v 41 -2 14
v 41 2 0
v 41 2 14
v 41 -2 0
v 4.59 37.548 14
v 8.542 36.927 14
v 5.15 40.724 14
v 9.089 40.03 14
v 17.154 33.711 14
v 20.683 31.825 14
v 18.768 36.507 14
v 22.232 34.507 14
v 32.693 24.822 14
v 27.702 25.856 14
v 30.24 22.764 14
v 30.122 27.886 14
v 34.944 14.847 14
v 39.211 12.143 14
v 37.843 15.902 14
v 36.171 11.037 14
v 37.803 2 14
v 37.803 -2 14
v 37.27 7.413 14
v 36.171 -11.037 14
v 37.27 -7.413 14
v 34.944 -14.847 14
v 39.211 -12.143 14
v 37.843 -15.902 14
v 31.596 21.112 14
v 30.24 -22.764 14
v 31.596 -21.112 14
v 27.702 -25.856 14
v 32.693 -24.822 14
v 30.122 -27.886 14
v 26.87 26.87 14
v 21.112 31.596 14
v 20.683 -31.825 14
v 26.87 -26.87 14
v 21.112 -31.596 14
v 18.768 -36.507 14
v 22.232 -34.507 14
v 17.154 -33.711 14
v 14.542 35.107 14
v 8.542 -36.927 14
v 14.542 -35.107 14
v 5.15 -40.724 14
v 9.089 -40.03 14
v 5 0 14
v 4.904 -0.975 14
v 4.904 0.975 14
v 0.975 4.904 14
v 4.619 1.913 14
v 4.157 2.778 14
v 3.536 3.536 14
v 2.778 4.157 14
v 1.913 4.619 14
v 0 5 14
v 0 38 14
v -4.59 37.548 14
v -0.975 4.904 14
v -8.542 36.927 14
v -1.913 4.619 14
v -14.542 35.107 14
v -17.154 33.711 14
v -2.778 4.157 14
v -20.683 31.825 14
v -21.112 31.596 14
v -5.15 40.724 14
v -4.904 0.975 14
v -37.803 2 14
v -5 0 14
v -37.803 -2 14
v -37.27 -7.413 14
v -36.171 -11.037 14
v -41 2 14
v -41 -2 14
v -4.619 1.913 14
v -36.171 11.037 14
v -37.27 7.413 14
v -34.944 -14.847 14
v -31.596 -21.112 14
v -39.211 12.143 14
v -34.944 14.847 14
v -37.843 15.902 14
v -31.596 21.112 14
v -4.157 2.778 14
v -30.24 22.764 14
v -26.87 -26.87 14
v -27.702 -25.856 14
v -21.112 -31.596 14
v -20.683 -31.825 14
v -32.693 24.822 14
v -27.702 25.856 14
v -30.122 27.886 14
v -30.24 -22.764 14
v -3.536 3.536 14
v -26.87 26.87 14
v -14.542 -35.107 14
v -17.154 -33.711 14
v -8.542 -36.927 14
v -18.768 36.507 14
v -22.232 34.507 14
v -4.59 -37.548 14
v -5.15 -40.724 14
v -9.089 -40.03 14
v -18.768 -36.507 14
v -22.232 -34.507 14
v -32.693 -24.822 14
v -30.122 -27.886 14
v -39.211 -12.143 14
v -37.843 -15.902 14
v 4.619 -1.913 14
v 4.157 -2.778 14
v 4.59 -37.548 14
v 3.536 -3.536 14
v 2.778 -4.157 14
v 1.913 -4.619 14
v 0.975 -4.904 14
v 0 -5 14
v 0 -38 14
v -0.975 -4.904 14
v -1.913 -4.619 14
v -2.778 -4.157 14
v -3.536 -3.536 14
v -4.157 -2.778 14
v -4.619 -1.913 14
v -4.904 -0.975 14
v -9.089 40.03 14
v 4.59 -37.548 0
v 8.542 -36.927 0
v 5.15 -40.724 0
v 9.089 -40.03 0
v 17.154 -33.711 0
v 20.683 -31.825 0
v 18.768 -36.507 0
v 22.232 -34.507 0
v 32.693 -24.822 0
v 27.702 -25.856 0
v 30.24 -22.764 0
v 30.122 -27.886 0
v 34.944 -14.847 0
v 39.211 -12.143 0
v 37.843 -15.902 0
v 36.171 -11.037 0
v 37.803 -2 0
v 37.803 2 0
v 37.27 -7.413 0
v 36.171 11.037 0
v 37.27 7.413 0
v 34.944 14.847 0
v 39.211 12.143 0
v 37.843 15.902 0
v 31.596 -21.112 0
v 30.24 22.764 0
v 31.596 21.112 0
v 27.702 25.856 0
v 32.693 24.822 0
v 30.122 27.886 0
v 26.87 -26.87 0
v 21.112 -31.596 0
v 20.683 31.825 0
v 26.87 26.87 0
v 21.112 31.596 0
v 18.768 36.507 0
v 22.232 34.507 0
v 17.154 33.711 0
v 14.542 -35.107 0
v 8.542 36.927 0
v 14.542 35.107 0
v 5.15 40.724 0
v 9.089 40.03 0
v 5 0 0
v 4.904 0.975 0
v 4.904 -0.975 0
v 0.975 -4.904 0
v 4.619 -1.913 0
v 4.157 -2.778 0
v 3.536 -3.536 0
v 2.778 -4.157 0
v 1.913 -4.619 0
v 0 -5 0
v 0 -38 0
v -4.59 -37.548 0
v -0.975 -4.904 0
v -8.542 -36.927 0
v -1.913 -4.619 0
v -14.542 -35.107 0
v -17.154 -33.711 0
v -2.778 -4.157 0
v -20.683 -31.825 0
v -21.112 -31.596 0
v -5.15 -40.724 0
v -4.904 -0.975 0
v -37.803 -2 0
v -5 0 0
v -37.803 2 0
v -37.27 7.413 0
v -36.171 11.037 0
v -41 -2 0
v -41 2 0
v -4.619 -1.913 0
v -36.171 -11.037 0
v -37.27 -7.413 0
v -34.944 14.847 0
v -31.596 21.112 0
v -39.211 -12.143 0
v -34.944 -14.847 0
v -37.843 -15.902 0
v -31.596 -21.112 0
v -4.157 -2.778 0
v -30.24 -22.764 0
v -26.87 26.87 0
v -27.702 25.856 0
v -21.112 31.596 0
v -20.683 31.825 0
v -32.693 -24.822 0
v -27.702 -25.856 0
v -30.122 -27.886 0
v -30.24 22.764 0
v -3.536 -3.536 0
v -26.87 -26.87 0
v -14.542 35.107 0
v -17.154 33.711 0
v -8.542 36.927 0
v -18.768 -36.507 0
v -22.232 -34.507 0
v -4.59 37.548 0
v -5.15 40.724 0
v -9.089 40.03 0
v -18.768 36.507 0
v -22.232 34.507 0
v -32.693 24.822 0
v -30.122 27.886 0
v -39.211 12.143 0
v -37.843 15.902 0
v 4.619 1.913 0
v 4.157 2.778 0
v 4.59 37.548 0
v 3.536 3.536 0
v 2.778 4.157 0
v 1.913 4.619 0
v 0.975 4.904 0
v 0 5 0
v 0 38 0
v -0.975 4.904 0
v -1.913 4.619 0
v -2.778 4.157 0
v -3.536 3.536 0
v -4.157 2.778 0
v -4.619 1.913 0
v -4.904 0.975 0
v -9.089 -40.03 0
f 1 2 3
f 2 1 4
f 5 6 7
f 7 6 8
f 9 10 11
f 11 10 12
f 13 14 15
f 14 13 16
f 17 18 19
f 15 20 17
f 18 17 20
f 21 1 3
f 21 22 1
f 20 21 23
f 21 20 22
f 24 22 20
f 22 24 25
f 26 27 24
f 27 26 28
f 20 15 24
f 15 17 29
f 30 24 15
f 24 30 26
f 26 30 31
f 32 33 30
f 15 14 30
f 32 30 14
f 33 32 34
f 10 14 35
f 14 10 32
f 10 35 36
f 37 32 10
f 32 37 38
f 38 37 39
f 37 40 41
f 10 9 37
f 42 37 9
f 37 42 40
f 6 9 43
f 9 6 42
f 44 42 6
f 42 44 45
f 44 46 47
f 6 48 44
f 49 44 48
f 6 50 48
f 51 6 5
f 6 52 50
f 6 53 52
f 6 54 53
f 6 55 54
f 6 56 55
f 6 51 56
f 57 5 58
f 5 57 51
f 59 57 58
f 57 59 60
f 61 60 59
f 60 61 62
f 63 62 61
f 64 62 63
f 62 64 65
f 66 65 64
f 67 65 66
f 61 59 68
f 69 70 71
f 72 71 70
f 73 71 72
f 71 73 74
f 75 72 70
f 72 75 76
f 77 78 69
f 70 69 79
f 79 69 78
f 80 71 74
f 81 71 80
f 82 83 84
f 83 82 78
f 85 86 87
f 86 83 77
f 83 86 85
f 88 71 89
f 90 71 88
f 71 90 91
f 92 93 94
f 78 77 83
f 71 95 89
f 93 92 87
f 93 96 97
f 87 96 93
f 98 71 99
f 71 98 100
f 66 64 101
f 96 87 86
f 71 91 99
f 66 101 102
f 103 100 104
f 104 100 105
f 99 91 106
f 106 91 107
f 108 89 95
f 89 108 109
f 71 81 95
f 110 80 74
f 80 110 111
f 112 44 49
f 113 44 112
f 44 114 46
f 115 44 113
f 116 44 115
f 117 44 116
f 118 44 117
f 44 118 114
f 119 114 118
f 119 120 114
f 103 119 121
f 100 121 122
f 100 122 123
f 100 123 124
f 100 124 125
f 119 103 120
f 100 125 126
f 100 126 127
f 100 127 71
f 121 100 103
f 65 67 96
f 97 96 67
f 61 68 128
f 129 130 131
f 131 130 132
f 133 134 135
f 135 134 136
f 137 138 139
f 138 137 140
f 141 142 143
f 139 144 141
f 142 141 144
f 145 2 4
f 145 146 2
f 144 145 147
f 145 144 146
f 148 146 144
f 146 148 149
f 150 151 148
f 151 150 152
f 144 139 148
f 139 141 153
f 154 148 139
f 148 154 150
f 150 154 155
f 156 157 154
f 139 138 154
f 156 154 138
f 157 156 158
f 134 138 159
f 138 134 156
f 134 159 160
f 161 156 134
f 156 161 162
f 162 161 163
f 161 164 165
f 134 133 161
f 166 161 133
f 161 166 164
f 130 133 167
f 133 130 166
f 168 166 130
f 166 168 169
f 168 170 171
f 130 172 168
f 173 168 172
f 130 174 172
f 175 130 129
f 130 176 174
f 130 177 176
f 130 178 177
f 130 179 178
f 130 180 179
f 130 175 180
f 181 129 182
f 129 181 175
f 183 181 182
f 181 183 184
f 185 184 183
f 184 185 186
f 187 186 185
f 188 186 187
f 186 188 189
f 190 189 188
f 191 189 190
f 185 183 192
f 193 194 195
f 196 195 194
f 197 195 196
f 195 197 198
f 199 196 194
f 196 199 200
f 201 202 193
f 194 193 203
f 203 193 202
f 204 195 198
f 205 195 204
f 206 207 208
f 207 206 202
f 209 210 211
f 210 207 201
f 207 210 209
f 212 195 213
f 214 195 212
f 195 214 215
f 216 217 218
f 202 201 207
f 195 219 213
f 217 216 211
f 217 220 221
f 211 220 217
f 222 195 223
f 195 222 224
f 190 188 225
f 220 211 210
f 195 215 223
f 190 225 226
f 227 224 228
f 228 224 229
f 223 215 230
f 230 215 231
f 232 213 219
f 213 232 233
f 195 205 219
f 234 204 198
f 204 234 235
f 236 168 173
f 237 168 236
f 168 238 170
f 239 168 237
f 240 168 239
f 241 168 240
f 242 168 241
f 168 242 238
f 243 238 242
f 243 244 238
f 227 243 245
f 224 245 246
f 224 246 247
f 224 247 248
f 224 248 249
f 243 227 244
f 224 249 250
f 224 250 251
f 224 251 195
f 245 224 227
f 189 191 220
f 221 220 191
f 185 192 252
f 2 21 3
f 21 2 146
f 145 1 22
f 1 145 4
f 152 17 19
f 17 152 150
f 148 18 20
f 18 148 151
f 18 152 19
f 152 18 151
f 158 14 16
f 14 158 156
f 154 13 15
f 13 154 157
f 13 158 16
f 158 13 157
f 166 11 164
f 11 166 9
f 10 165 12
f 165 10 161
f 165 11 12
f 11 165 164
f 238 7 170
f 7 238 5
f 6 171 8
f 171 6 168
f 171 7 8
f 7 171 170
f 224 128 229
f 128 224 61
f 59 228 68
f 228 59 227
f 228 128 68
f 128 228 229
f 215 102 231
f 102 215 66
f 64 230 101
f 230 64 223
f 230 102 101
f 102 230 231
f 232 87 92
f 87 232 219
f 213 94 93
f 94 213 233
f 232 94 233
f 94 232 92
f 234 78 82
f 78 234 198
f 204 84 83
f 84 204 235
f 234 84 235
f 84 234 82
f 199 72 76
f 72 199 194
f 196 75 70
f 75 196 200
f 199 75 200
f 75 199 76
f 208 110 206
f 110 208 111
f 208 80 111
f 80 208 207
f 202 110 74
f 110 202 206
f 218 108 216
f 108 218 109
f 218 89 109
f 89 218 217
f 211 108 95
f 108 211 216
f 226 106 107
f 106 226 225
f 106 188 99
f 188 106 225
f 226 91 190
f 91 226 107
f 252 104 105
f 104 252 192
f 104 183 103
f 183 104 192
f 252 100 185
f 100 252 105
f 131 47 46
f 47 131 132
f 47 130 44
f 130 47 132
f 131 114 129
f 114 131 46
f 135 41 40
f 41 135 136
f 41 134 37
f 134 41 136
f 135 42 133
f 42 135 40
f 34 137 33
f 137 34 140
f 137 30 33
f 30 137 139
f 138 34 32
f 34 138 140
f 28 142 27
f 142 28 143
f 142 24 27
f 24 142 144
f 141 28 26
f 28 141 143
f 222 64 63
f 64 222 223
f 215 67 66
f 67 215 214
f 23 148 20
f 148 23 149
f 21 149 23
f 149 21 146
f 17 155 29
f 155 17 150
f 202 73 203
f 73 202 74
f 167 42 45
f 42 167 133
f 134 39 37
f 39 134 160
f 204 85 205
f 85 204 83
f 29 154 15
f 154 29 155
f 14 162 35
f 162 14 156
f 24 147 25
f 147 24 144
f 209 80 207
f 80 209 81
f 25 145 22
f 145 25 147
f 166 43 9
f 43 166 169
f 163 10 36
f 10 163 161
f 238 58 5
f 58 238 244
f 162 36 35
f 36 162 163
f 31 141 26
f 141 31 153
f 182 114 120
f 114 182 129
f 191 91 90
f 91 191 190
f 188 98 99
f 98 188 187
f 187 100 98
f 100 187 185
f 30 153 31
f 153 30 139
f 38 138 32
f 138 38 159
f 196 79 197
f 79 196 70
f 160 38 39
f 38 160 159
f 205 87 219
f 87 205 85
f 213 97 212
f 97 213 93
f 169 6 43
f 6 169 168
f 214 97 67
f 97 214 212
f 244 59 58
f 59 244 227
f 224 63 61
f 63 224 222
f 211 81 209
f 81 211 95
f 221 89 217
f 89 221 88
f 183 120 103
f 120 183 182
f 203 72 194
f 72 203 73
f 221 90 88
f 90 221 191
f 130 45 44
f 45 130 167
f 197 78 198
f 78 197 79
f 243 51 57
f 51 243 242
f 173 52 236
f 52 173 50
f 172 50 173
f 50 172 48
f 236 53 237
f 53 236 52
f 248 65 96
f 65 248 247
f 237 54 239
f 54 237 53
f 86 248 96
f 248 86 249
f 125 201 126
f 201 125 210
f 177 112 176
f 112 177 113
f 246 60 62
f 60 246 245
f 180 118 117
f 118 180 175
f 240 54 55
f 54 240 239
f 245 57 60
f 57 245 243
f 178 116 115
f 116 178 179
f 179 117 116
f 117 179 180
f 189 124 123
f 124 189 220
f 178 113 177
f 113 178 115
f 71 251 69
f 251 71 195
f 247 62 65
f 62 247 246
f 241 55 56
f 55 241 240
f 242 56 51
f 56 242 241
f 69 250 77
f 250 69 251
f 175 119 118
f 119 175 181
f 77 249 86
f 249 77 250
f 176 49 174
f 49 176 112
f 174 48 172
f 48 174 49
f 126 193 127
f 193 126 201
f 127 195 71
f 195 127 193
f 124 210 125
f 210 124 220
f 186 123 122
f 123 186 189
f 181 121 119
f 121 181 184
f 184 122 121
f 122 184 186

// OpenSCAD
$fn = 32;

// ----------------------------------------------------------------------
// Spur blank: bored gear blank
// ----------------------------------------------------------------------

// --- parameters (mm) ---
disc_r = 38;              // blank root radius
disc_t = 14;              // blank thickness
n_teeth = 18;             // stub tooth count
tooth_w = 4;              // tooth width at the root
tooth_h = 3;              // tooth height above the root
bore_r = 5;               // central bore radius

out_r = disc_r + tooth_h;  // tip radius
bbox_x = 82.0;  // measured width over the teeth
bbox_y = 81.45;  // measured depth over the teeth

difference() {
union() {
  cylinder(r = disc_r, h = disc_t);
  for (i = [0 : n_teeth - 1])
    rotate([0, 0, i * 360 / n_teeth])
      translate([disc_r - 1, -tooth_w / 2, 0])
        cube([tooth_h + 1, tooth_w, disc_t]);
}
  translate([0, 0, -1]) cylinder(r = bore_r, h = disc_t + 2);
}
